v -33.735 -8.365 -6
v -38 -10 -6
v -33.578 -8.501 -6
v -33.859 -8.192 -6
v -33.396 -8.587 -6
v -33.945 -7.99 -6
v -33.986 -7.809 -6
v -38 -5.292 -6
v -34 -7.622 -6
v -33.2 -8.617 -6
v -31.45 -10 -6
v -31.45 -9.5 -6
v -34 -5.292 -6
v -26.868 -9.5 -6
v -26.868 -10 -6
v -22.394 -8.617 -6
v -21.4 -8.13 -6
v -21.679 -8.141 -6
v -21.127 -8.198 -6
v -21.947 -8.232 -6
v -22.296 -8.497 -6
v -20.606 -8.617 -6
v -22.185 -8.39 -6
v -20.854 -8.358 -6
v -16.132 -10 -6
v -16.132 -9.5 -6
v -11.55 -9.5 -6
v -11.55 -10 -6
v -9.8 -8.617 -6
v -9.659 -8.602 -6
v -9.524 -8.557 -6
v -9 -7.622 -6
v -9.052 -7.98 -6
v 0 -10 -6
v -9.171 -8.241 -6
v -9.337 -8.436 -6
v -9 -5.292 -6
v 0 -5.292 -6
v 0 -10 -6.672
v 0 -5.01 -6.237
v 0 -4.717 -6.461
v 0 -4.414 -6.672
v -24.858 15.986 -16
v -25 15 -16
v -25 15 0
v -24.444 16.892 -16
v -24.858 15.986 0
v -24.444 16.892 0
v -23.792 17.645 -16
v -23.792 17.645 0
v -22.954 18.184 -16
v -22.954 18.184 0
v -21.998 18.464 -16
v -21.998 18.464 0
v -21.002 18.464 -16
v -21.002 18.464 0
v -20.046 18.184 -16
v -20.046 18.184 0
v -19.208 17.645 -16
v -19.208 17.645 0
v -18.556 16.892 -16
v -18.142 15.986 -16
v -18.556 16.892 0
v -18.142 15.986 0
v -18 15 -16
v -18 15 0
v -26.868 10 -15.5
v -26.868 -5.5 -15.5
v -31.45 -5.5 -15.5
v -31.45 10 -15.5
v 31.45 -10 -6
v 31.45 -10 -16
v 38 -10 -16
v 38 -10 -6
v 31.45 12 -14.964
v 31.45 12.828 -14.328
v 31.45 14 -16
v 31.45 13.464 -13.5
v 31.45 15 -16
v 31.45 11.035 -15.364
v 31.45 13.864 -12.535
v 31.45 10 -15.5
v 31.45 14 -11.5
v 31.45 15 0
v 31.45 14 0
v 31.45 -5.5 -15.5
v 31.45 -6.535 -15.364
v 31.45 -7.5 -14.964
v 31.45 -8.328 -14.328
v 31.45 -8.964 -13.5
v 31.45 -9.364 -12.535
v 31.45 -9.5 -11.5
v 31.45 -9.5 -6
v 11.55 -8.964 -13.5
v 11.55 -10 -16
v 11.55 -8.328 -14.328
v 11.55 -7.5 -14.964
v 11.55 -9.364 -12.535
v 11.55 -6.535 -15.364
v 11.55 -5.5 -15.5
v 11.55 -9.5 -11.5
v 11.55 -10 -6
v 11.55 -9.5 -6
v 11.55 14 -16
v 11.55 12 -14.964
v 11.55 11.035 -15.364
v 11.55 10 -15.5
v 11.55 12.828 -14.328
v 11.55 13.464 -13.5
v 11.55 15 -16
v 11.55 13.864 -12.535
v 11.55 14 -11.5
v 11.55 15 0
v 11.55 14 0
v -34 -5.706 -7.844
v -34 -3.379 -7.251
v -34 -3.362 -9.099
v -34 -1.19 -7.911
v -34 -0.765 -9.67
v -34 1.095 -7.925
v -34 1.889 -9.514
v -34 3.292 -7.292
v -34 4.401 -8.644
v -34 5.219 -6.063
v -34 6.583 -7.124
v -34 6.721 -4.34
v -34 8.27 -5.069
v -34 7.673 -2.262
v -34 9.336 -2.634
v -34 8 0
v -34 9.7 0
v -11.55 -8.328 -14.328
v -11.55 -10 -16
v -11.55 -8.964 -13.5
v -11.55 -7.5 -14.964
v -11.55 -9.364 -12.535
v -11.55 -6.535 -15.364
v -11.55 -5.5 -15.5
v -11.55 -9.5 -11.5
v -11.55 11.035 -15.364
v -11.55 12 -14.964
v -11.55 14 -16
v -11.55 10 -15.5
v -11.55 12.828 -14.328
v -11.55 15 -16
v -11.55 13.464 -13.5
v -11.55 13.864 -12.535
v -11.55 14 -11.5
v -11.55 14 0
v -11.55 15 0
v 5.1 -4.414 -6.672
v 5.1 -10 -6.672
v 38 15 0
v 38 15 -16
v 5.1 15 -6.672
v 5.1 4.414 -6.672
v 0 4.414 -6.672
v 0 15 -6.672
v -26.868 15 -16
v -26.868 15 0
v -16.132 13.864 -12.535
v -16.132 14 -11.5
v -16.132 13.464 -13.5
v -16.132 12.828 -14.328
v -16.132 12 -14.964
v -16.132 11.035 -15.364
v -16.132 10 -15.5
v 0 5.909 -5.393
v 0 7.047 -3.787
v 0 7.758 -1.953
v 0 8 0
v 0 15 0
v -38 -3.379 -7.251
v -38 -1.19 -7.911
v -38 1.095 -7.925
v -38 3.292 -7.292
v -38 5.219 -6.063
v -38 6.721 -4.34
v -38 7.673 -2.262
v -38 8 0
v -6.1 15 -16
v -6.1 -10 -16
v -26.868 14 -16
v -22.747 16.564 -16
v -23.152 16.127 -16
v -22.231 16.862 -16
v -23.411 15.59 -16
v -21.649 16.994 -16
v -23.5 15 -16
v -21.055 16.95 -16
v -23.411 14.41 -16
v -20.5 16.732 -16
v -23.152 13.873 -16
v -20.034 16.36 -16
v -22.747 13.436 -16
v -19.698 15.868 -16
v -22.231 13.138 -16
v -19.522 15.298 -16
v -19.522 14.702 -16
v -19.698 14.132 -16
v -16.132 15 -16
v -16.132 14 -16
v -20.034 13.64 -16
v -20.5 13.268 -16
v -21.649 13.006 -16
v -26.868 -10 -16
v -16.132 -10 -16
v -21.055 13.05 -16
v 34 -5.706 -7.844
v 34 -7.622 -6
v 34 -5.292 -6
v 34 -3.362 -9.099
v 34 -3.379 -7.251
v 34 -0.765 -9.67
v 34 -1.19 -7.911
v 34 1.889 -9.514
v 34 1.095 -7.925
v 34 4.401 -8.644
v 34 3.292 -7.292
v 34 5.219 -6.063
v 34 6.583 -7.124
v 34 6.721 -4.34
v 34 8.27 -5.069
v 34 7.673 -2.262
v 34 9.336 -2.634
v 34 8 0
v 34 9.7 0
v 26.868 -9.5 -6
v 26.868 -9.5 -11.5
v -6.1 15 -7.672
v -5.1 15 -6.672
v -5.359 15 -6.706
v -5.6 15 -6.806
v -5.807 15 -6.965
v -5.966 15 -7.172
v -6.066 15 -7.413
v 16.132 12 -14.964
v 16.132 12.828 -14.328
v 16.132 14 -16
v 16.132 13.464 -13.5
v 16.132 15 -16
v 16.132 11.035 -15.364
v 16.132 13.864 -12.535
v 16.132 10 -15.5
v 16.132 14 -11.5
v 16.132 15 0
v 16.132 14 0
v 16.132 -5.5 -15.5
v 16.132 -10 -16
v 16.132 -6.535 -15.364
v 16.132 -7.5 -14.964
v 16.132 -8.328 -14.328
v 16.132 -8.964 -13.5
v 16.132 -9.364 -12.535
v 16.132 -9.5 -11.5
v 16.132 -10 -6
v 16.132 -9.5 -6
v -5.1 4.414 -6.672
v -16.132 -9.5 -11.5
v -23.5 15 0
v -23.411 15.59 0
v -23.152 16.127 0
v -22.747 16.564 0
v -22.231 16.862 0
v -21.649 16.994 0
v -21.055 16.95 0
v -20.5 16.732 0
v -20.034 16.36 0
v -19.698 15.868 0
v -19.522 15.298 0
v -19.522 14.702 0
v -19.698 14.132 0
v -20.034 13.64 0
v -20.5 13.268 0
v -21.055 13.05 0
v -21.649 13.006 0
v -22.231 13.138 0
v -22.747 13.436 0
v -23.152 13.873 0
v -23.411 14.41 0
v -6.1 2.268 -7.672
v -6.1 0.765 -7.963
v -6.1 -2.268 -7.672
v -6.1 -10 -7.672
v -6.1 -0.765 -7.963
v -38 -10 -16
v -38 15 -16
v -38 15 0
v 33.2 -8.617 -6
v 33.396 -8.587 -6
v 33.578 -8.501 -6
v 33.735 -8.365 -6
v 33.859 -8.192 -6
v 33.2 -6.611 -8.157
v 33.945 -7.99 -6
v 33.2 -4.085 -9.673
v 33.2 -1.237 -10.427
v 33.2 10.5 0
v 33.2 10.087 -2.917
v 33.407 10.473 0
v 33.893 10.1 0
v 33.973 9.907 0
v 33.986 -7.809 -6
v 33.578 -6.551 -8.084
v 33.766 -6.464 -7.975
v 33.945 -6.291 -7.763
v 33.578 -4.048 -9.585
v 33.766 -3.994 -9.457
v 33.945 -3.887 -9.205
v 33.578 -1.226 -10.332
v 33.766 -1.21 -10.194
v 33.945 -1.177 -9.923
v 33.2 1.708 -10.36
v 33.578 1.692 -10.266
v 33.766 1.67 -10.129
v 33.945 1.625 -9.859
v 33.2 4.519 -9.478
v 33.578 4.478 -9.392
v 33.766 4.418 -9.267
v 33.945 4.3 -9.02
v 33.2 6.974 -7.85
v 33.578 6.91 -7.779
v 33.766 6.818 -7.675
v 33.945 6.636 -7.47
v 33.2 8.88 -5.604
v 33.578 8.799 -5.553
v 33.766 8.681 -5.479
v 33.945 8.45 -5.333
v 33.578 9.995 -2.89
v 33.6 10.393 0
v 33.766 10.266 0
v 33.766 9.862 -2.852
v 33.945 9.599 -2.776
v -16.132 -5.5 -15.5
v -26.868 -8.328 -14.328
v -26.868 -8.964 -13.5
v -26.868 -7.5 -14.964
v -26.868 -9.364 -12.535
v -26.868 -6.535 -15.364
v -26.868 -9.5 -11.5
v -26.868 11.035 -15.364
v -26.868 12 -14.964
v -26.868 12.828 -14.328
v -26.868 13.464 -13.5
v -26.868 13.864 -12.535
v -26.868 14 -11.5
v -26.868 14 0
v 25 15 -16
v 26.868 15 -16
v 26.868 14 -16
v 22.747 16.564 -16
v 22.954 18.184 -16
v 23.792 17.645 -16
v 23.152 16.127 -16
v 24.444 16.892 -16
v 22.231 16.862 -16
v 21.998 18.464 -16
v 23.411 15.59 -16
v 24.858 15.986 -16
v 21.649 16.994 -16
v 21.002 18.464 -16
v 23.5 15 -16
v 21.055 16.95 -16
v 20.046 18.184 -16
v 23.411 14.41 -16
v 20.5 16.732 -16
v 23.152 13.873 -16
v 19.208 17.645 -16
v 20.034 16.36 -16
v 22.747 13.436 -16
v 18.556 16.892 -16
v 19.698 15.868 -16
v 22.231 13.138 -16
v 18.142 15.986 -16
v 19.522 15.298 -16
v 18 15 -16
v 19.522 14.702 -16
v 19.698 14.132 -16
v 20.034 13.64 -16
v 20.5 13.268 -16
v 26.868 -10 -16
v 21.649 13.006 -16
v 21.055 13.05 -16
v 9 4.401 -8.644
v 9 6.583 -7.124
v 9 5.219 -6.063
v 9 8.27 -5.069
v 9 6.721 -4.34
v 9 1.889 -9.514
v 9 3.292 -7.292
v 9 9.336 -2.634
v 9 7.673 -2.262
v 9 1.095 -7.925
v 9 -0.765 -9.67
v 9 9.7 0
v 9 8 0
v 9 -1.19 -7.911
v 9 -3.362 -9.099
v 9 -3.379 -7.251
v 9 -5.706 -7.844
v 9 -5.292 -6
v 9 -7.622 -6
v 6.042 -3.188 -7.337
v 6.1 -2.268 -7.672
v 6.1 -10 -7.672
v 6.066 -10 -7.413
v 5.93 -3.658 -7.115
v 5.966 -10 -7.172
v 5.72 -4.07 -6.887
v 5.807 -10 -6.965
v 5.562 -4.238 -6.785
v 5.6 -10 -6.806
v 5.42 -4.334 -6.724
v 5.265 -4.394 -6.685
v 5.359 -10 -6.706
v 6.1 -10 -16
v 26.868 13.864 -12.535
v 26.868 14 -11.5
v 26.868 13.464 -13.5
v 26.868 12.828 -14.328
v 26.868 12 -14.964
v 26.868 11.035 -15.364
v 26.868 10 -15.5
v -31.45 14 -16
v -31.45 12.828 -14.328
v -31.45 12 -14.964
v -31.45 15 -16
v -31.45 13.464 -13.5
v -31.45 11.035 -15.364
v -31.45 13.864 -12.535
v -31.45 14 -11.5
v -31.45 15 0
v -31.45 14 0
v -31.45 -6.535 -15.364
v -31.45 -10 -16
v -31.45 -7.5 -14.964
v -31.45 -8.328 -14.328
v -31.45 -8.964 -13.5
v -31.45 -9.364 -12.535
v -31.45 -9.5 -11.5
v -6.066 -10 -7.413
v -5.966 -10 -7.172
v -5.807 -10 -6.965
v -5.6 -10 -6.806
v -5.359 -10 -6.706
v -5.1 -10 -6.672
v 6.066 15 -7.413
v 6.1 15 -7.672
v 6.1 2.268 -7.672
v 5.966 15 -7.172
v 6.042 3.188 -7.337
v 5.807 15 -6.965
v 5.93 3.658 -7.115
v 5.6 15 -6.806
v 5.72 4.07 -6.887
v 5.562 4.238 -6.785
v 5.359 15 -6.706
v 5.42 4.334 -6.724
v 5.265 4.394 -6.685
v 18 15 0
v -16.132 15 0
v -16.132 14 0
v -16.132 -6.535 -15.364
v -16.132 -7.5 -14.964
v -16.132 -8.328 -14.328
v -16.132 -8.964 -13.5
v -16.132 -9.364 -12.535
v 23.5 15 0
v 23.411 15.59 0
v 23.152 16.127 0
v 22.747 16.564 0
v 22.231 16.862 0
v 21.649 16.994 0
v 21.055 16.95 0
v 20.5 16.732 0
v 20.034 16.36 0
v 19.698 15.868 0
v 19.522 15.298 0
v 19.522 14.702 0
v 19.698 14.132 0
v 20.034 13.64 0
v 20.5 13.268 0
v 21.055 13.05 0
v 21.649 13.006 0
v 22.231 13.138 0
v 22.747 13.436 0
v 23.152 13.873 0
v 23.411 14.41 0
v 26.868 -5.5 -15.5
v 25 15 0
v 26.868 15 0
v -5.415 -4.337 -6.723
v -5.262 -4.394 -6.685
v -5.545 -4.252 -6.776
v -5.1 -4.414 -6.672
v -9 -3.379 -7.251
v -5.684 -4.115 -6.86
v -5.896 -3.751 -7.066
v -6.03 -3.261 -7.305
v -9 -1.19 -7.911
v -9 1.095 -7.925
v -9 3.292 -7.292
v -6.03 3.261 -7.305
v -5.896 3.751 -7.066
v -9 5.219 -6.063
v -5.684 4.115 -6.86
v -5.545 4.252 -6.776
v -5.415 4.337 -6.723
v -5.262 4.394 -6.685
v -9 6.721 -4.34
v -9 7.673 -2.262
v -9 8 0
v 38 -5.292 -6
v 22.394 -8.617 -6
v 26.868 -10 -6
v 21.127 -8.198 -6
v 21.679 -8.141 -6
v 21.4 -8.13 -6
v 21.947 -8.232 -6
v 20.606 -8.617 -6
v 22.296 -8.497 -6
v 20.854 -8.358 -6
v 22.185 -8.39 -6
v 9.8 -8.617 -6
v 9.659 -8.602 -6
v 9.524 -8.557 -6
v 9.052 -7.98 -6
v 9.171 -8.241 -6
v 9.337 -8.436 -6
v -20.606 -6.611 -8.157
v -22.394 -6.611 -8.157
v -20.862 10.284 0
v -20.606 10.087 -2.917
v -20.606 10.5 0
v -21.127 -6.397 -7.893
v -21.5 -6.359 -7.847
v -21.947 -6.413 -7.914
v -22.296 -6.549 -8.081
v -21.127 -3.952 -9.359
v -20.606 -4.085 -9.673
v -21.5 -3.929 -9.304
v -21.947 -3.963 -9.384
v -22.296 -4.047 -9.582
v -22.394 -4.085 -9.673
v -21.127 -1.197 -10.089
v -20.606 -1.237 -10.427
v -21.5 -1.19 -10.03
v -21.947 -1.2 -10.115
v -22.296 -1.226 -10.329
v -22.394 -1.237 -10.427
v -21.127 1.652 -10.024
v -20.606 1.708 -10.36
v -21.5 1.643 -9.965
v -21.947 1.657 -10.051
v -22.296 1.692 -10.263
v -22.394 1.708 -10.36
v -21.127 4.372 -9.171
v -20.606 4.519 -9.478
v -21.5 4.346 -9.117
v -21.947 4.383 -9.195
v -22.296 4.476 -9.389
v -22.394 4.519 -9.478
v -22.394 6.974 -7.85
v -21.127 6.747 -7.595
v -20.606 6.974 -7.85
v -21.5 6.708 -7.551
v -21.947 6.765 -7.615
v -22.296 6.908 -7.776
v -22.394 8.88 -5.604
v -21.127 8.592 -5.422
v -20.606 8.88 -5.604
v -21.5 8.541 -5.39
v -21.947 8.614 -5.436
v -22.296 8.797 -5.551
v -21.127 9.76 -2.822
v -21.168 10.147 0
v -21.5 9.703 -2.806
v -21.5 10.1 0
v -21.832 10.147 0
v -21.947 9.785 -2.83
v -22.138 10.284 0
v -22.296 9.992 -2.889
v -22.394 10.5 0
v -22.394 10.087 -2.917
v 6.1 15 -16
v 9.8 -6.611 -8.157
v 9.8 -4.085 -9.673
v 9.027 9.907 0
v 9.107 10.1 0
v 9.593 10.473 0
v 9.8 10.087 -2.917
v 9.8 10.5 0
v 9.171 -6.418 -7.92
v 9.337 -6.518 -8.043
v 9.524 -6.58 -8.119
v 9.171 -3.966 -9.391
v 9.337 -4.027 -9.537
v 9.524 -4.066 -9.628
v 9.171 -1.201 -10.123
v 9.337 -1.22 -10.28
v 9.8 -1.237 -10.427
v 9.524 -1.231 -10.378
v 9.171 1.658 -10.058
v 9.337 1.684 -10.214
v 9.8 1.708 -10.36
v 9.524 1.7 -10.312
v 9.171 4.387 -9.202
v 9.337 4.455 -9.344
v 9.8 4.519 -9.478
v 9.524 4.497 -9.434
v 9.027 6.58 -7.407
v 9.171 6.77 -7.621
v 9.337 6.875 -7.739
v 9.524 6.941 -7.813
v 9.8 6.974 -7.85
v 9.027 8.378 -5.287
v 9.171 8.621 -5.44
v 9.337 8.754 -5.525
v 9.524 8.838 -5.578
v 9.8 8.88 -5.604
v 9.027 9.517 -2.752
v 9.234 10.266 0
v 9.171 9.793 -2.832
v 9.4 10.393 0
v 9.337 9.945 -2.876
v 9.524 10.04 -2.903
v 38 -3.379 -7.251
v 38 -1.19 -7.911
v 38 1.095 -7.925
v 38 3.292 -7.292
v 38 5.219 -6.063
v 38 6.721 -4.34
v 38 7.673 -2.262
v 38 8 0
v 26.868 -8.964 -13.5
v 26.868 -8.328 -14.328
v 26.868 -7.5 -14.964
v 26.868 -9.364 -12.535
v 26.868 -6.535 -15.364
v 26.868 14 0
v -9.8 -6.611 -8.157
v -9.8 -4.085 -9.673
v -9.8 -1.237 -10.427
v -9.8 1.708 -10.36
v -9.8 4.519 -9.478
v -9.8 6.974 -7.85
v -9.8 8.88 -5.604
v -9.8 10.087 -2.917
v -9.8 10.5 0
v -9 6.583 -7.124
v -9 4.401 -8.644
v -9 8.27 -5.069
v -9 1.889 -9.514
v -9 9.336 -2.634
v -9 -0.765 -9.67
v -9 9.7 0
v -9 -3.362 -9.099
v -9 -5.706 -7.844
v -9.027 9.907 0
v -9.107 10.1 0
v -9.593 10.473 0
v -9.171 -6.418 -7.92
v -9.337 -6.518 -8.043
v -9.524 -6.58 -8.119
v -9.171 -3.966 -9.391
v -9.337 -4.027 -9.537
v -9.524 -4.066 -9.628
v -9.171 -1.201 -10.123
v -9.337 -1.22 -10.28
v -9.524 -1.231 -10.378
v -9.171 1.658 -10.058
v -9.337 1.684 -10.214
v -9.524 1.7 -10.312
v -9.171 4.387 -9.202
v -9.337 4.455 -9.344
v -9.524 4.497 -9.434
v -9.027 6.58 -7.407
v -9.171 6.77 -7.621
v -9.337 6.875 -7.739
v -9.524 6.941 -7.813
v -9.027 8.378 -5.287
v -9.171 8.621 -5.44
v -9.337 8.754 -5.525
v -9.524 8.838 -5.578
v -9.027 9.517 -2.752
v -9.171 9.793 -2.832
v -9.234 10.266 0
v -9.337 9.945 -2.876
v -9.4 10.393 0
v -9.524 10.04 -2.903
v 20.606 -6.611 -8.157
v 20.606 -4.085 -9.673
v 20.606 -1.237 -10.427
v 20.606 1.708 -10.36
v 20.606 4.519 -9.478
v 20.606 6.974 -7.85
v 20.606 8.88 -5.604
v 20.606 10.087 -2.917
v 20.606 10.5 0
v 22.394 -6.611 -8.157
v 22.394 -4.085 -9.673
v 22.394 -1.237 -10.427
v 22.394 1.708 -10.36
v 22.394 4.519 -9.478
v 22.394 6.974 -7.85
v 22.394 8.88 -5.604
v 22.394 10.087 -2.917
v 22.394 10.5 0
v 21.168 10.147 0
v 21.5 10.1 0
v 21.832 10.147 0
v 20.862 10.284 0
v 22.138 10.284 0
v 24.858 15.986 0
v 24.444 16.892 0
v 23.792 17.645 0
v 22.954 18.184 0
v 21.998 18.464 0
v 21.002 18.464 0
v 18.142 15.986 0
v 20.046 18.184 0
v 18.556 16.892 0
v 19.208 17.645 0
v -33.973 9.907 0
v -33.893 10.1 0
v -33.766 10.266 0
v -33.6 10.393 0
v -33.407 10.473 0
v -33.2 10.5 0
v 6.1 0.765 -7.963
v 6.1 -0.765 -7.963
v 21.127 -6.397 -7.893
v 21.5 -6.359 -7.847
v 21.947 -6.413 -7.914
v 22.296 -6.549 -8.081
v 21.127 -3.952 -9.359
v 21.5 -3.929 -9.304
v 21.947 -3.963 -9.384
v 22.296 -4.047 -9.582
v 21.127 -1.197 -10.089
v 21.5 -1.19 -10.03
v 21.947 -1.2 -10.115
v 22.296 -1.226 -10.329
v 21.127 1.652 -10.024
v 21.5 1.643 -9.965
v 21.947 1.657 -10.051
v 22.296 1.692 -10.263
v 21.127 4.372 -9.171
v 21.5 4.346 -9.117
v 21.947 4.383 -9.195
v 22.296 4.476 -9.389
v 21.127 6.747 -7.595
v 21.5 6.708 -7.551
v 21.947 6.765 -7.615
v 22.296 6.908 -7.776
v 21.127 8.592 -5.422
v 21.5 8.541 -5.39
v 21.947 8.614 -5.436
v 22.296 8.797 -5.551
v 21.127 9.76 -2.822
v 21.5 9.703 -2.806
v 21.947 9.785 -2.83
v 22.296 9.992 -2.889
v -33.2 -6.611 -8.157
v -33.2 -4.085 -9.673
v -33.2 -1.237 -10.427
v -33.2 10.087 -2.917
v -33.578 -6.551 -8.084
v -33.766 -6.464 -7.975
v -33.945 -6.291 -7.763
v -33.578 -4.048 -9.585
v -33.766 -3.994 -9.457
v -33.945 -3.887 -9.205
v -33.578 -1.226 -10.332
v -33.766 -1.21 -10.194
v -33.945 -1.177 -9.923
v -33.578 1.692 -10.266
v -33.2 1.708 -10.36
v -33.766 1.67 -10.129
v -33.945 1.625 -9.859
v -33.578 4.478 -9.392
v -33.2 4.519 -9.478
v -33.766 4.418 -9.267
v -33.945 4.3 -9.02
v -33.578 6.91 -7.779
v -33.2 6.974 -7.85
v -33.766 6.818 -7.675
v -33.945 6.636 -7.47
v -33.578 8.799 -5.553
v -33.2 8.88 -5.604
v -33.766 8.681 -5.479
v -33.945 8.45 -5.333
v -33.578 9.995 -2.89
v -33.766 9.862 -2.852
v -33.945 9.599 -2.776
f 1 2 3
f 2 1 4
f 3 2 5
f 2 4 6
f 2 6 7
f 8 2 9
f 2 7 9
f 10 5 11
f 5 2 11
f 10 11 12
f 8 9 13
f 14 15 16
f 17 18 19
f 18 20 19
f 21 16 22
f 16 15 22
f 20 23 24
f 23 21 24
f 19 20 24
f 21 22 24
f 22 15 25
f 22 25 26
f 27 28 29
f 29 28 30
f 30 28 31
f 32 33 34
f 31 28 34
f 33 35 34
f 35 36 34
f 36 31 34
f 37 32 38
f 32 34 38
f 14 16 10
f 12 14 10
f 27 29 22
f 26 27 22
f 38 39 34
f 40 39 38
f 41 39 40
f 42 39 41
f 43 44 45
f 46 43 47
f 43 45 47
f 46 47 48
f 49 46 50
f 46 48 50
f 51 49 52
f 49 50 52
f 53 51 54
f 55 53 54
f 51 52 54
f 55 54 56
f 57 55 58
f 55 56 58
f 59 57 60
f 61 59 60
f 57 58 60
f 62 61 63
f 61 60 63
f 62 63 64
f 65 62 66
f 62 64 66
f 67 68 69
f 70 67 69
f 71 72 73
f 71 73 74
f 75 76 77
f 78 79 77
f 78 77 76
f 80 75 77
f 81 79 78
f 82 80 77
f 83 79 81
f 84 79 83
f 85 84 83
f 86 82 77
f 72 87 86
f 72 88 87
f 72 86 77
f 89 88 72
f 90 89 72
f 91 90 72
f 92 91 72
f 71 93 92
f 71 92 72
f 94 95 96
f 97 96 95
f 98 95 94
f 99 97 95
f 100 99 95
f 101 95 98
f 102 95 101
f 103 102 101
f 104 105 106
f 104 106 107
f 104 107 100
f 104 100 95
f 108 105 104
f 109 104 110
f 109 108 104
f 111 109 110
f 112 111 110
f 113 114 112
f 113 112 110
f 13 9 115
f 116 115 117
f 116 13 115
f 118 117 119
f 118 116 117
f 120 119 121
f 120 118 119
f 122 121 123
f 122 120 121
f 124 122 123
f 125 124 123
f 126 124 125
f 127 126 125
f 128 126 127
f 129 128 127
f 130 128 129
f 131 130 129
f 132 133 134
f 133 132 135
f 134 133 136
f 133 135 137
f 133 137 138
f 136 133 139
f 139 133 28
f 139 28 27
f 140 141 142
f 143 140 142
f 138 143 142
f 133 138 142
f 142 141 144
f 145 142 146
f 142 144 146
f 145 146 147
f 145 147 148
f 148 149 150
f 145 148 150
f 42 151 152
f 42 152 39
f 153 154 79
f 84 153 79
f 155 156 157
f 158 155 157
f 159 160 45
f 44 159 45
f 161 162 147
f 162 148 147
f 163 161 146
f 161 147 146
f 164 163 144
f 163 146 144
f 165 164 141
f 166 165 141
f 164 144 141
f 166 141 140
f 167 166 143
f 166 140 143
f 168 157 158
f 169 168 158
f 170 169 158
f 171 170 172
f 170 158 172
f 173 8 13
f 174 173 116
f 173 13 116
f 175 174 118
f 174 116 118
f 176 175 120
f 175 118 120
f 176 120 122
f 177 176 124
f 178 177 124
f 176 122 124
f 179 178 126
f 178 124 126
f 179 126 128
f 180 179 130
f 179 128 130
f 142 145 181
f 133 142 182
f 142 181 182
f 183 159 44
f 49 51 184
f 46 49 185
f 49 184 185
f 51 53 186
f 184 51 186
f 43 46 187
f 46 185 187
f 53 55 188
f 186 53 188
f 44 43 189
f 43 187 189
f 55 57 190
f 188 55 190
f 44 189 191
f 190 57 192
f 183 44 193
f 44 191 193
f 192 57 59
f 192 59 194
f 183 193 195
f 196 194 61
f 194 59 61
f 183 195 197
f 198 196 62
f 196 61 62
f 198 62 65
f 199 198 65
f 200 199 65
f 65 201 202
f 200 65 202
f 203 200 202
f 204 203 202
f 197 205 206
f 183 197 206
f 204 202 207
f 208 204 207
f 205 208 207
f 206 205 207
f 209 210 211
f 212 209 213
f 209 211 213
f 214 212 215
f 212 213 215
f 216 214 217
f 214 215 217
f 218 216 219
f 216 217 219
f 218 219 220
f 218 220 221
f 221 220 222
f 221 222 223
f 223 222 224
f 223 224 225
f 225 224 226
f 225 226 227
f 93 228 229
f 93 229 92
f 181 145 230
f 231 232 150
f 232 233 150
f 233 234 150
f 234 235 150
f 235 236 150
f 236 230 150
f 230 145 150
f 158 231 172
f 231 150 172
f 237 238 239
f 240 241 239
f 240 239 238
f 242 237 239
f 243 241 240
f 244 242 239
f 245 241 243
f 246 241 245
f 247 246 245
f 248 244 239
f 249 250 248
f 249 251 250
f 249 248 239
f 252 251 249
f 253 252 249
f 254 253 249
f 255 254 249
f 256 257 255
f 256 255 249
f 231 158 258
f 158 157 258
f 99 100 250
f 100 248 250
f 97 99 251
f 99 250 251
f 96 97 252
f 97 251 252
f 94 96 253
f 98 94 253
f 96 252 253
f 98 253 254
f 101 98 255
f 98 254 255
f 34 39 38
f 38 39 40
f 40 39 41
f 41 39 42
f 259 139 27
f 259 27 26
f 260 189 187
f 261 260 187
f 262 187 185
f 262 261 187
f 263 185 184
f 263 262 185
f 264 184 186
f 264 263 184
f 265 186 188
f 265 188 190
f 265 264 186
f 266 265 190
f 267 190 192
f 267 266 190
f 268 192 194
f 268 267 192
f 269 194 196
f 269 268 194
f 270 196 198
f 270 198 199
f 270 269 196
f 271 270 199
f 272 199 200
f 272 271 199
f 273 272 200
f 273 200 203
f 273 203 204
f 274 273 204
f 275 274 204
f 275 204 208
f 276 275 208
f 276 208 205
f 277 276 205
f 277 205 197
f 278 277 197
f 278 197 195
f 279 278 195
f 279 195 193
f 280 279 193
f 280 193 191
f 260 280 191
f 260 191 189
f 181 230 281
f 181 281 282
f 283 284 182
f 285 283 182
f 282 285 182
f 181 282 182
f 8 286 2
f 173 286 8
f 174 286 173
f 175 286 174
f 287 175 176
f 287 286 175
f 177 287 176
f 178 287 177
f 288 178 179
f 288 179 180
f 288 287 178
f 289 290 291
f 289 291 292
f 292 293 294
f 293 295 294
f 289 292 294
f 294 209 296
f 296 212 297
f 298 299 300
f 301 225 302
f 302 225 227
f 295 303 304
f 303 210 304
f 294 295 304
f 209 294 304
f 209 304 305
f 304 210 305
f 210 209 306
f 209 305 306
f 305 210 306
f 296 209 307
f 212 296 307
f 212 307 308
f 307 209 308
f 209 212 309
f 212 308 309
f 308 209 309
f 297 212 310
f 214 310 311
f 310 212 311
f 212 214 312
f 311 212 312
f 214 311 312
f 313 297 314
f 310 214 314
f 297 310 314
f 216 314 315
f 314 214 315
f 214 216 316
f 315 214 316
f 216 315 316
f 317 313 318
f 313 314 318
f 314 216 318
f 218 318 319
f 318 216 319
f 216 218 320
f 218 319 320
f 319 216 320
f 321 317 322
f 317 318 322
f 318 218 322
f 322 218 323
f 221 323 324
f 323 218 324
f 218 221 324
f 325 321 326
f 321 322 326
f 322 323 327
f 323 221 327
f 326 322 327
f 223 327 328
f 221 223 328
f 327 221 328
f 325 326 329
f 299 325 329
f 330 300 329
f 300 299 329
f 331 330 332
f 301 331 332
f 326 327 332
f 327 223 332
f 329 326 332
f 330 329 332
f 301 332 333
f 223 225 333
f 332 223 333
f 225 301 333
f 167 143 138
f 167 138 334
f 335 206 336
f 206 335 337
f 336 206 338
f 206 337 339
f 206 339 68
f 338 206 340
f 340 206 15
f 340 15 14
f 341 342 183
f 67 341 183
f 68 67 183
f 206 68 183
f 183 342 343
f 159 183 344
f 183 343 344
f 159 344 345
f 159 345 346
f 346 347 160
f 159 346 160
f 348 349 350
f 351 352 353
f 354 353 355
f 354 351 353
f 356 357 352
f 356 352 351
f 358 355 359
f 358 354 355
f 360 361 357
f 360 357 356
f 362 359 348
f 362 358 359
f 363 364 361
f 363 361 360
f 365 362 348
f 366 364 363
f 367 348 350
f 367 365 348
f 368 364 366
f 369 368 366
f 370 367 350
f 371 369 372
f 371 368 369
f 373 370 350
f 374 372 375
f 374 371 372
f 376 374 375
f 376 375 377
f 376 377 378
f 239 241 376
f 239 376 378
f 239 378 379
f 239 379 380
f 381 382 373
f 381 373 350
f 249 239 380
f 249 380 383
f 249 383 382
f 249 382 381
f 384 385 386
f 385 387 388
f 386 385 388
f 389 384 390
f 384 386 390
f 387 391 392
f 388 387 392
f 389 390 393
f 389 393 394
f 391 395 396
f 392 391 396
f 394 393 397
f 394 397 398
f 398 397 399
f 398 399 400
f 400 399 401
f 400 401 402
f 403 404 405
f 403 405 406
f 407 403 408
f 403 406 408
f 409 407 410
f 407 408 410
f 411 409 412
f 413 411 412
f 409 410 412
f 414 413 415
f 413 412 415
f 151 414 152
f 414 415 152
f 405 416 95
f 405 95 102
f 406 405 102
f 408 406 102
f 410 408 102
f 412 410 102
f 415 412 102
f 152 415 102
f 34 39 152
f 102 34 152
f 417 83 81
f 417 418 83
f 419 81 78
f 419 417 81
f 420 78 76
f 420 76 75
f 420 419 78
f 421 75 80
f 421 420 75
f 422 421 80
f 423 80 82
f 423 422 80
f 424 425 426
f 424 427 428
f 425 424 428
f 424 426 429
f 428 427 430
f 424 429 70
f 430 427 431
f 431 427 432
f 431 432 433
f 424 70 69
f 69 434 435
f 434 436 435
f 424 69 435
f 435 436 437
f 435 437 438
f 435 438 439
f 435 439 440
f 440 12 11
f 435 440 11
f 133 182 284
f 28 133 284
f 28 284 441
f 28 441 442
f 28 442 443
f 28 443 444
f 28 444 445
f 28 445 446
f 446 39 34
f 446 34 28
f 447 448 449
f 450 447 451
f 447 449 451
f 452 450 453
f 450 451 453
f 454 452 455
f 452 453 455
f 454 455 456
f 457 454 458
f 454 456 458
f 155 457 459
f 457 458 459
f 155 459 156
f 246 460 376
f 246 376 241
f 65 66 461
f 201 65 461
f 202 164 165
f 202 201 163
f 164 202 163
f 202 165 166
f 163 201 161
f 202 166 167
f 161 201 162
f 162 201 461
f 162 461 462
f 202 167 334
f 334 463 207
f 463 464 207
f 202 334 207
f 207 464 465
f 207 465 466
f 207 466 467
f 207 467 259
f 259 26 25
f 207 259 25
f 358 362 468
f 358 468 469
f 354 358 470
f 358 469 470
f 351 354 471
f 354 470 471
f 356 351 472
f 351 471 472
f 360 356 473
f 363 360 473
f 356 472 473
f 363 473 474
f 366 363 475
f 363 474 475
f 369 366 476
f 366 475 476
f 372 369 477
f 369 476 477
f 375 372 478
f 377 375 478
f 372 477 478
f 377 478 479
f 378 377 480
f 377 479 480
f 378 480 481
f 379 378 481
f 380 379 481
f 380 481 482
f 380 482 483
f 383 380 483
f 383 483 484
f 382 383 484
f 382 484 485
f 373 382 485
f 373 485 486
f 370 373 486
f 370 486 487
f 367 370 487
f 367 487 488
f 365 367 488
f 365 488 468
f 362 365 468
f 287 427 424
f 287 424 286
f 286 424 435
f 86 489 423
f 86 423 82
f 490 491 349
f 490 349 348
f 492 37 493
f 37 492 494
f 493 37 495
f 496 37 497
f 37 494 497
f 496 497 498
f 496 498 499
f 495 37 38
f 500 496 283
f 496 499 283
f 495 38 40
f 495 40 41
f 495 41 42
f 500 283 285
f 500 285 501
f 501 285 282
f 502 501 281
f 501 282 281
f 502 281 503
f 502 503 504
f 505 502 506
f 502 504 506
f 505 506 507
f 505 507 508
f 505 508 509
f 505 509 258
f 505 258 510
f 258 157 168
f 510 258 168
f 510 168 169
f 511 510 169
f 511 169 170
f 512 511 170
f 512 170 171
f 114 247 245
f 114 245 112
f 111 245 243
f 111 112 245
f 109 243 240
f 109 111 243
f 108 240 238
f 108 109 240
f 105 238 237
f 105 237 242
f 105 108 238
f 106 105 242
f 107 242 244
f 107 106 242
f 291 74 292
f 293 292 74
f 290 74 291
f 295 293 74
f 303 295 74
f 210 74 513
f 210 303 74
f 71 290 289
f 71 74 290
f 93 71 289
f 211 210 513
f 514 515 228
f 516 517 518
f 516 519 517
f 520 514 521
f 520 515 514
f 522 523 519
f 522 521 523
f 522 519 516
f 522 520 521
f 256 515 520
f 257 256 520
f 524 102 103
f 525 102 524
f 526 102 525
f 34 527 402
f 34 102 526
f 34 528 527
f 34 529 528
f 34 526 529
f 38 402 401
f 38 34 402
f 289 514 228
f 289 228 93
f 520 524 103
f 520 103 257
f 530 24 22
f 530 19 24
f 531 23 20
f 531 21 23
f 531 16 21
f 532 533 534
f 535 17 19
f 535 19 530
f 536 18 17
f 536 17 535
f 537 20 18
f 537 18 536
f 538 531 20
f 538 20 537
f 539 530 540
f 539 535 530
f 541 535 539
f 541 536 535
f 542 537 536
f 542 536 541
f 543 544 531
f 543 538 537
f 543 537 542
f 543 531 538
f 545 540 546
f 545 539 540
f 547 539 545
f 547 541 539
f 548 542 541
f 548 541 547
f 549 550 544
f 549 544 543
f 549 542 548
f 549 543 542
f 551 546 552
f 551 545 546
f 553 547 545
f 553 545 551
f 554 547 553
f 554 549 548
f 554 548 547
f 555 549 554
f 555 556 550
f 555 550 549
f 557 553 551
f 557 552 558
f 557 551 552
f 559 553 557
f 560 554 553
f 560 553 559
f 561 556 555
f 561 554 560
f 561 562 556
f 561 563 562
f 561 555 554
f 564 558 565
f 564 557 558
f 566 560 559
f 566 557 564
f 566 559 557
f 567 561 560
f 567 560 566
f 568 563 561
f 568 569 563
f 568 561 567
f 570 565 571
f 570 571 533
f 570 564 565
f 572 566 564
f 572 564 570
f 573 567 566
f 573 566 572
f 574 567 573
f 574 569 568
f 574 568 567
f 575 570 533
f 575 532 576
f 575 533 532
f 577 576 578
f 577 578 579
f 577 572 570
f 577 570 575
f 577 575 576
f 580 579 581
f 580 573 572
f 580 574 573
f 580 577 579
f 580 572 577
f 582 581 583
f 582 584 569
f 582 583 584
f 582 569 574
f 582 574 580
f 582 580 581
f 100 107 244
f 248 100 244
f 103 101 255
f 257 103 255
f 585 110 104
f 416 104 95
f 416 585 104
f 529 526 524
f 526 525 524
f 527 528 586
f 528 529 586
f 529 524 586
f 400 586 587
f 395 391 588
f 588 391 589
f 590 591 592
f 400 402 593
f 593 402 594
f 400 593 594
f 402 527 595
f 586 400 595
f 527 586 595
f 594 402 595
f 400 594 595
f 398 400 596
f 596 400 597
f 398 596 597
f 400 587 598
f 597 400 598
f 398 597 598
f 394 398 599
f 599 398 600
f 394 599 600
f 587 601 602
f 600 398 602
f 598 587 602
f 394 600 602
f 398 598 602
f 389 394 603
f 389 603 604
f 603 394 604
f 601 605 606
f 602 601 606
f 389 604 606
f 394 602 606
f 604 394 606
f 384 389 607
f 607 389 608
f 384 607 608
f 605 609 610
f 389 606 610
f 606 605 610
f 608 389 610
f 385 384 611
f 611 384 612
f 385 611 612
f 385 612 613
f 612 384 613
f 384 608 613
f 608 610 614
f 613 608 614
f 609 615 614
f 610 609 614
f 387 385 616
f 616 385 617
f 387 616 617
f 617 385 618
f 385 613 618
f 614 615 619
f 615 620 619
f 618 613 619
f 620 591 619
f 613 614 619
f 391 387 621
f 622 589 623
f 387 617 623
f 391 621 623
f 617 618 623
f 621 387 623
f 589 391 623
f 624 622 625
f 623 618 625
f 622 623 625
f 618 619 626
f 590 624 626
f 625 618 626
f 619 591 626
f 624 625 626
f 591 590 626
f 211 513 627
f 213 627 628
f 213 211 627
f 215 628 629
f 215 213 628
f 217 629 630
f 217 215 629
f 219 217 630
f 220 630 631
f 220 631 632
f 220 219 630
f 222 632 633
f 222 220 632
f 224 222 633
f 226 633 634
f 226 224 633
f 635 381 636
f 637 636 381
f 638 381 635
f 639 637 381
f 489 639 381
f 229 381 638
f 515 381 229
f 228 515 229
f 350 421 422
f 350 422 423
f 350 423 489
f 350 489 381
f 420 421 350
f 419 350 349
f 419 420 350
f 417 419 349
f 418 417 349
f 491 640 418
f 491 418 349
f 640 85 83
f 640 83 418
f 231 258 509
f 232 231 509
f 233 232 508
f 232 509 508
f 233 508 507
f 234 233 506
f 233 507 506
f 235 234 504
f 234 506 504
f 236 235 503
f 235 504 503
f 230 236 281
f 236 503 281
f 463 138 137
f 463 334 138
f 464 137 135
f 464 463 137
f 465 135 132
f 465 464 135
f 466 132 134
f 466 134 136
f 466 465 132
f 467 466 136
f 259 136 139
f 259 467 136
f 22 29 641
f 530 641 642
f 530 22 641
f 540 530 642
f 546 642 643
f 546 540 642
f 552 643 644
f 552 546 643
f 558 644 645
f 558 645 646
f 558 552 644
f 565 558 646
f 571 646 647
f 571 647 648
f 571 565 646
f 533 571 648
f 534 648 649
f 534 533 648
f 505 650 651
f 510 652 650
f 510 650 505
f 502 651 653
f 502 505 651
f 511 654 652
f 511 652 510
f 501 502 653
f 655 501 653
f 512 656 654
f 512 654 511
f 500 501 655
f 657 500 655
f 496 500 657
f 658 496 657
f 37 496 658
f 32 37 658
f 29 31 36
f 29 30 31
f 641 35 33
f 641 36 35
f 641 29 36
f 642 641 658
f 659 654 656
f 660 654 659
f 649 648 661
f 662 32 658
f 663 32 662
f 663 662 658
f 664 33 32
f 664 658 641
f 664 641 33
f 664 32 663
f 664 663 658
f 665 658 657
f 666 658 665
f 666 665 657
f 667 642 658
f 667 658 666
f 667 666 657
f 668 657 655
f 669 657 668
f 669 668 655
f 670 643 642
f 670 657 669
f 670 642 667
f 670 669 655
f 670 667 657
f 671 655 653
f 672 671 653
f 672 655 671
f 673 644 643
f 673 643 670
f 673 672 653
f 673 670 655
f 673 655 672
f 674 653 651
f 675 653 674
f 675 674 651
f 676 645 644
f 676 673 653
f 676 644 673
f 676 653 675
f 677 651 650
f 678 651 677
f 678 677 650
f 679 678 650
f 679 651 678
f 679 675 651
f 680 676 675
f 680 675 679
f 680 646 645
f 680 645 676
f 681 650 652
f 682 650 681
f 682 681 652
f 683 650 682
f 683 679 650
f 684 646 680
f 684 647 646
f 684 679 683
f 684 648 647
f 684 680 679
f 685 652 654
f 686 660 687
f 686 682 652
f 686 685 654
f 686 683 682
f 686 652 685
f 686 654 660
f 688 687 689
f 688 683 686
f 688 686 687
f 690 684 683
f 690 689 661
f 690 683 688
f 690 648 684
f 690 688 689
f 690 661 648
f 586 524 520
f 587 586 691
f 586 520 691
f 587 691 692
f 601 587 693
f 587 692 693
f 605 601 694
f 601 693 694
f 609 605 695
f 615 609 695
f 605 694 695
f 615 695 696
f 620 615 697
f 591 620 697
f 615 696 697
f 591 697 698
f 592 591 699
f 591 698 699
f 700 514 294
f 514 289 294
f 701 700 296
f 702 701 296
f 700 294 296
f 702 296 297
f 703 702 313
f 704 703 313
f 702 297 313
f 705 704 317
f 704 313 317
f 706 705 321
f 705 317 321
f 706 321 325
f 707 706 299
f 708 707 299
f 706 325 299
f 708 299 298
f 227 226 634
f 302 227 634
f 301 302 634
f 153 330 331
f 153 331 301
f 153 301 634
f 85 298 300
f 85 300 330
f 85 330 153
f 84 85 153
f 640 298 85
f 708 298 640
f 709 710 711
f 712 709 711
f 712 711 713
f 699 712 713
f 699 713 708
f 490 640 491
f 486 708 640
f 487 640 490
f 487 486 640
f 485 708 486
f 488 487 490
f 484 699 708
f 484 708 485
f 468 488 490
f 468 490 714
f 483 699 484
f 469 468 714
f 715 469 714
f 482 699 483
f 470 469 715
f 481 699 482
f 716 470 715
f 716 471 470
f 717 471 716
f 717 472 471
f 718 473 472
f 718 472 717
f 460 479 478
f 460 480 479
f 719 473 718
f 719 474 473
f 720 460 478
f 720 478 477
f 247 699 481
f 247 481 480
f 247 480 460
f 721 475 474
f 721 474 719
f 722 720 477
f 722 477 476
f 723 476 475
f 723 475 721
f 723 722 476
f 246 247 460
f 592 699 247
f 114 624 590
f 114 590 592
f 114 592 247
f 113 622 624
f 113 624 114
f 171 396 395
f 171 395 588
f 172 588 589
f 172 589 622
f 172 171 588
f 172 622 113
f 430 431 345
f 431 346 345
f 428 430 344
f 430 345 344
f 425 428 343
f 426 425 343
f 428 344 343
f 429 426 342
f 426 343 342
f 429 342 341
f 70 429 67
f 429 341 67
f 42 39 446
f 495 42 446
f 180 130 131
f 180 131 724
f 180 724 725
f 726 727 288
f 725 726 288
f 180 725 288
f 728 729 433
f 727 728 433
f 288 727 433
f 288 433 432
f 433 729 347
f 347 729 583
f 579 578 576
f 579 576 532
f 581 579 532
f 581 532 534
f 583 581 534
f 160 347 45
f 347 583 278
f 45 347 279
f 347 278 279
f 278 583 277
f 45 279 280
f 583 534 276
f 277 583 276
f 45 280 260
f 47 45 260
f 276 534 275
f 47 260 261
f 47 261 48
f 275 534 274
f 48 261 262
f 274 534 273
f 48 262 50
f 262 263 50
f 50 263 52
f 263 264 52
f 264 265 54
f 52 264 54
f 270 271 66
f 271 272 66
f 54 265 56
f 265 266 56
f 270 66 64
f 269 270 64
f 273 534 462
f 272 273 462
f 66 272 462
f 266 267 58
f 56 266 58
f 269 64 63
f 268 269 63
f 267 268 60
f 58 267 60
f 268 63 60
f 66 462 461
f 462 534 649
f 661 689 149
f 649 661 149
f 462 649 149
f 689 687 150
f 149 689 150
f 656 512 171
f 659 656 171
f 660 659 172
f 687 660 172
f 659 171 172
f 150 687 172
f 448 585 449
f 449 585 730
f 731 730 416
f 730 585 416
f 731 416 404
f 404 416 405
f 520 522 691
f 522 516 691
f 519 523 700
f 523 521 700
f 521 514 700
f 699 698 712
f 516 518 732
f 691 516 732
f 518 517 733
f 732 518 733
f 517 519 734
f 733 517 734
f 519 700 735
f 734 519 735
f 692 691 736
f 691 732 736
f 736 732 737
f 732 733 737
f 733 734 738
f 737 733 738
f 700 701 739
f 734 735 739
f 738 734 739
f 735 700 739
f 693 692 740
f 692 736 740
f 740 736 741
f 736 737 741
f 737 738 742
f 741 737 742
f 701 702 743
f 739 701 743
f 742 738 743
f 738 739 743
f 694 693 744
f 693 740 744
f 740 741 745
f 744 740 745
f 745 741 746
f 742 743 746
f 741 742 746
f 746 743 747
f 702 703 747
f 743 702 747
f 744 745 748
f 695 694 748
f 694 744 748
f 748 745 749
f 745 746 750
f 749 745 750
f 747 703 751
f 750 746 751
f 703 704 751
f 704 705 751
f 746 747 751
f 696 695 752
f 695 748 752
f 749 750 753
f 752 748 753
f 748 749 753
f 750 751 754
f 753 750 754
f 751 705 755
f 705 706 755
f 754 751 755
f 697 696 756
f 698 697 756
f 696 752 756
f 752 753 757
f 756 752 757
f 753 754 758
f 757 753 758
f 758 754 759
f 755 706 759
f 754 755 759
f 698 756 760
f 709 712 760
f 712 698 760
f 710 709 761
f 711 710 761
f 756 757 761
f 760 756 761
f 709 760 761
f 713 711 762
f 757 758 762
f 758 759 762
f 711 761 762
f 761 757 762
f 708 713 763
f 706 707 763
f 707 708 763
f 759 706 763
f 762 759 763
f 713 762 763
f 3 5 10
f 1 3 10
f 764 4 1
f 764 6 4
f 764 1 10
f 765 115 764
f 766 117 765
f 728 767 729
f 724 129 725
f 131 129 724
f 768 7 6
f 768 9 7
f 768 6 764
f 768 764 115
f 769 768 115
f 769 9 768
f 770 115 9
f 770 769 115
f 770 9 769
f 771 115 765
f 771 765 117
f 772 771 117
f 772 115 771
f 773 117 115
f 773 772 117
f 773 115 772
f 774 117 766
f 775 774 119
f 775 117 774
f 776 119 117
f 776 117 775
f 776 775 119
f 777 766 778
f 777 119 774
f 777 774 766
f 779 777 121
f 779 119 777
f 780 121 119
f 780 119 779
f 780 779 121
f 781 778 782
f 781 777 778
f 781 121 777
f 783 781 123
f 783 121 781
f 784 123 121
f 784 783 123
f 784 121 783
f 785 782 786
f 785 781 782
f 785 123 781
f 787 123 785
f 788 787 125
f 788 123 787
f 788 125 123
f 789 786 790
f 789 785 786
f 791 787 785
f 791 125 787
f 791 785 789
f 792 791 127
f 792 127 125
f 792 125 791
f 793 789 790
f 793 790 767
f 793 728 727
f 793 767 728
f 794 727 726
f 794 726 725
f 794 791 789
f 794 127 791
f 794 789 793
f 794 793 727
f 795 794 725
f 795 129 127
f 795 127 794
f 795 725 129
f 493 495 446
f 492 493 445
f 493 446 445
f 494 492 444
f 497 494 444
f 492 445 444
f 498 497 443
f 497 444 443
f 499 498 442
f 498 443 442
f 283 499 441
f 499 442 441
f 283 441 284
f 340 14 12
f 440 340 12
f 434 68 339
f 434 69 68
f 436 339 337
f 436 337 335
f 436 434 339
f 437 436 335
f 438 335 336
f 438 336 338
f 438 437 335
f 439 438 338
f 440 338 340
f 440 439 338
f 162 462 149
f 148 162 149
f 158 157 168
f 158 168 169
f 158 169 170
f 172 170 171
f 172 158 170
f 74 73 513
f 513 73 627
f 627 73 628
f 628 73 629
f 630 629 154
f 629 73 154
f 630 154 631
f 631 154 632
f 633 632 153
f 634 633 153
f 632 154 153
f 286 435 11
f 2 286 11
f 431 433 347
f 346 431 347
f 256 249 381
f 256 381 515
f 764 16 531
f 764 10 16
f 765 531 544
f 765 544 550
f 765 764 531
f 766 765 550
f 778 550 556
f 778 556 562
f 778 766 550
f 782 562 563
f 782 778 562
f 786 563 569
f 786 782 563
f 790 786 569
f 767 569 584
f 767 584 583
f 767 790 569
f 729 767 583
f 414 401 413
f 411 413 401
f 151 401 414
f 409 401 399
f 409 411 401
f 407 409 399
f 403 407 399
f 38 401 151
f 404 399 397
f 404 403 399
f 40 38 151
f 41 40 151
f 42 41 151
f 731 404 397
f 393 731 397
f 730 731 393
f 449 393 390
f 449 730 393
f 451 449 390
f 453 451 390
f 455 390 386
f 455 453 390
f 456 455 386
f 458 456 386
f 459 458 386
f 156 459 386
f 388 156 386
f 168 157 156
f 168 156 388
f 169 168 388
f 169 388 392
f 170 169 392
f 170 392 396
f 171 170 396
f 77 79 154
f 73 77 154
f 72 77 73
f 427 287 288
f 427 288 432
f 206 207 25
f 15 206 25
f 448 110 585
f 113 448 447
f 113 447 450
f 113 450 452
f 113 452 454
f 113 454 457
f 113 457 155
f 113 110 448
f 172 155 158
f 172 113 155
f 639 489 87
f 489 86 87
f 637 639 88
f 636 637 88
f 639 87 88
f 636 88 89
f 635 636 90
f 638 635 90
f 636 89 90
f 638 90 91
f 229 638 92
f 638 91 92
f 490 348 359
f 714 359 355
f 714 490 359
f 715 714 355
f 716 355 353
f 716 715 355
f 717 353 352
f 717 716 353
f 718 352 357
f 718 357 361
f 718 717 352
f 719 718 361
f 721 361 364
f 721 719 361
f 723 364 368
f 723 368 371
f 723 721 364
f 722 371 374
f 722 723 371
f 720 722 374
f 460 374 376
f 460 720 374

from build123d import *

# Parameters (mm, degrees)
BOSS_EXTRUDE1_DEPTH = 38
SKETCH4_R           = 2
CUT_EXTRUDE1_DEPTH  = 38
SKETCH11_W          = 4.582575695
SKETCH11_H          = 1
CUT_EXTRUDE2_DEPTH  = 30
SKETCH13_W          = 4.582575695
SKETCH13_H          = 1
CUT_EXTRUDE3_DEPTH  = 30
FILLET1_R           = 4
CUT_EXTRUDE4_DEPTH  = 40


with BuildPart() as part:
    # Sketch5 → Boss-Extrude1 (new body)
    with BuildSketch(Plane(origin=(0, 0, 0), x_dir=(0, 0, -1), z_dir=(1, 0, 0))):
        with BuildLine():
            Line((0, 18.5), (16, 18.5))
            Line((16, 18.5), (16, -10))
            Line((16, -10), (6, -10))
            Line((6, -10), (6, -5.291502622))
            ThreePointArc((6, -5.291502622), (7.291502622, 3.291502622), (0, 8))
            Line((0, 8), (0, 18.5))
        make_face()
    extrude(amount=BOSS_EXTRUDE1_DEPTH)

    # Sketch2 → Cut-Revolve1 (revolve, cut)
    with BuildSketch(Plane.XY):
        with BuildLine():
            Line((22.394427191, 10.5), (33.2, 10.5))
            ThreePointArc((33.2, 10.5), (33.765685425, 10.265685425), (34, 9.7))
            Line((34, 9.7), (34, 0))
            Line((34, 0), (9, 0))
            Line((9, 0), (9, 9.7))
            ThreePointArc((9, 9.7), (9.234314575, 10.265685425), (9.8, 10.5))
            Line((9.8, 10.5), (20.605572809, 10.5))
            ThreePointArc((20.605572809, 10.5), (21.5, 10.1), (22.394427191, 10.5))
        make_face()
    revolve(axis=Axis((0, 0, 0), (1, 0, 0)), mode=Mode.SUBTRACT)

    # Sketch4 → Cut-Extrude1 (cut)
    with BuildSketch(Plane.XY):
        with Locations((21.5, 15)):
            Circle(SKETCH4_R)
        with BuildLine():
            Line((11.549695158, 15), (0, 15))
            Line((0, 15), (0, 25))
            Line((0, 25), (38, 25))
            Line((38, 25), (38, 15))
            Line((38, 15), (31.450304842, 15))
            Line((31.450304842, 15), (31.450304842, 14))
            Line((31.450304842, 14), (26.867729147, 14))
            Line((26.867729147, 14), (26.867729147, 15))
            Line((26.867729147, 15), (25, 15))
            ThreePointArc((25, 15), (21.5, 18.5), (18, 15))
            Line((18, 15), (16.132270853, 15))
            Line((16.132270853, 15), (16.132270853, 14))
            Line((16.132270853, 14), (11.549695158, 14))
            Line((11.549695158, 14), (11.549695158, 15))
        make_face()
    extrude(amount=-CUT_EXTRUDE1_DEPTH, mode=Mode.SUBTRACT)

    # Sketch11 → Cut-Extrude2 (cut)
    with BuildSketch(Plane.XY):
        with Locations((29.159016994, -10)):
            Rectangle(SKETCH11_W, SKETCH11_H)
        with Locations((13.840983006, -10)):
            Rectangle(SKETCH11_W, SKETCH11_H)
    extrude(amount=-CUT_EXTRUDE2_DEPTH, mode=Mode.SUBTRACT)

    # Sketch13 → Cut-Extrude3 (cut)
    with BuildSketch(Plane.XZ.offset(10)):
        with Locations((29.159016994, -16)):
            Rectangle(SKETCH13_W, SKETCH13_H)
        with Locations((13.840983006, -16)):
            Rectangle(SKETCH13_W, SKETCH13_H)
    extrude(amount=-CUT_EXTRUDE3_DEPTH, mode=Mode.SUBTRACT)

    # Fillet1
    fillet1_edges = [part.edges().sort_by_distance(p)[0] for p in [
        (29.159016994, -9.5, -15.5),
        (29.159016994, 14, -15.5),
        (13.840983006, 14, -15.5),
        (13.840983006, -9.5, -15.5),
    ]]
    fillet(fillet1_edges, radius=FILLET1_R)


with BuildPart() as body_2:
    # Mirror1: mirrored copy
    add(part.part.mirror(Plane(origin=(0, 0, 0), x_dir=(0, 0, 1), z_dir=(1, 0, 0))))


with BuildPart() as cut_extrude4_tool:
    # Sketch14 → Cut-Extrude4 (new body)
    with BuildSketch(Plane.XZ.offset(10)):
        with BuildLine():
            Line((6.1, -17.67179677), (6.1, -7.67179677))
            ThreePointArc((6.1, -7.67179677), (5.807106781, -6.964689989), (5.1, -6.67179677))
            Line((5.1, -6.67179677), (-5.1, -6.67179677))
            ThreePointArc((-5.1, -6.67179677), (-5.807106781, -6.964689989), (-6.1, -7.67179677))
            Line((-6.1, -7.67179677), (-6.1, -17.67179677))
            ThreePointArc((-6.1, -17.67179677), (-5.807106781, -18.378903551), (-5.1, -18.67179677))
            Line((-5.1, -18.67179677), (5.1, -18.67179677))
            ThreePointArc((5.1, -18.67179677), (5.807106781, -18.378903551), (6.1, -17.67179677))
        make_face()
    extrude(amount=-CUT_EXTRUDE4_DEPTH)


with BuildPart() as part_1:
    add(part.part)

    # Cut-Extrude4: cut by cut_extrude4_tool
    add(cut_extrude4_tool.part, mode=Mode.SUBTRACT)


with BuildPart() as body_2_1:
    add(body_2.part)

    # Cut-Extrude4: cut by cut_extrude4_tool
    add(cut_extrude4_tool.part, mode=Mode.SUBTRACT)


solid = Compound([part_1.part, body_2_1.part])
